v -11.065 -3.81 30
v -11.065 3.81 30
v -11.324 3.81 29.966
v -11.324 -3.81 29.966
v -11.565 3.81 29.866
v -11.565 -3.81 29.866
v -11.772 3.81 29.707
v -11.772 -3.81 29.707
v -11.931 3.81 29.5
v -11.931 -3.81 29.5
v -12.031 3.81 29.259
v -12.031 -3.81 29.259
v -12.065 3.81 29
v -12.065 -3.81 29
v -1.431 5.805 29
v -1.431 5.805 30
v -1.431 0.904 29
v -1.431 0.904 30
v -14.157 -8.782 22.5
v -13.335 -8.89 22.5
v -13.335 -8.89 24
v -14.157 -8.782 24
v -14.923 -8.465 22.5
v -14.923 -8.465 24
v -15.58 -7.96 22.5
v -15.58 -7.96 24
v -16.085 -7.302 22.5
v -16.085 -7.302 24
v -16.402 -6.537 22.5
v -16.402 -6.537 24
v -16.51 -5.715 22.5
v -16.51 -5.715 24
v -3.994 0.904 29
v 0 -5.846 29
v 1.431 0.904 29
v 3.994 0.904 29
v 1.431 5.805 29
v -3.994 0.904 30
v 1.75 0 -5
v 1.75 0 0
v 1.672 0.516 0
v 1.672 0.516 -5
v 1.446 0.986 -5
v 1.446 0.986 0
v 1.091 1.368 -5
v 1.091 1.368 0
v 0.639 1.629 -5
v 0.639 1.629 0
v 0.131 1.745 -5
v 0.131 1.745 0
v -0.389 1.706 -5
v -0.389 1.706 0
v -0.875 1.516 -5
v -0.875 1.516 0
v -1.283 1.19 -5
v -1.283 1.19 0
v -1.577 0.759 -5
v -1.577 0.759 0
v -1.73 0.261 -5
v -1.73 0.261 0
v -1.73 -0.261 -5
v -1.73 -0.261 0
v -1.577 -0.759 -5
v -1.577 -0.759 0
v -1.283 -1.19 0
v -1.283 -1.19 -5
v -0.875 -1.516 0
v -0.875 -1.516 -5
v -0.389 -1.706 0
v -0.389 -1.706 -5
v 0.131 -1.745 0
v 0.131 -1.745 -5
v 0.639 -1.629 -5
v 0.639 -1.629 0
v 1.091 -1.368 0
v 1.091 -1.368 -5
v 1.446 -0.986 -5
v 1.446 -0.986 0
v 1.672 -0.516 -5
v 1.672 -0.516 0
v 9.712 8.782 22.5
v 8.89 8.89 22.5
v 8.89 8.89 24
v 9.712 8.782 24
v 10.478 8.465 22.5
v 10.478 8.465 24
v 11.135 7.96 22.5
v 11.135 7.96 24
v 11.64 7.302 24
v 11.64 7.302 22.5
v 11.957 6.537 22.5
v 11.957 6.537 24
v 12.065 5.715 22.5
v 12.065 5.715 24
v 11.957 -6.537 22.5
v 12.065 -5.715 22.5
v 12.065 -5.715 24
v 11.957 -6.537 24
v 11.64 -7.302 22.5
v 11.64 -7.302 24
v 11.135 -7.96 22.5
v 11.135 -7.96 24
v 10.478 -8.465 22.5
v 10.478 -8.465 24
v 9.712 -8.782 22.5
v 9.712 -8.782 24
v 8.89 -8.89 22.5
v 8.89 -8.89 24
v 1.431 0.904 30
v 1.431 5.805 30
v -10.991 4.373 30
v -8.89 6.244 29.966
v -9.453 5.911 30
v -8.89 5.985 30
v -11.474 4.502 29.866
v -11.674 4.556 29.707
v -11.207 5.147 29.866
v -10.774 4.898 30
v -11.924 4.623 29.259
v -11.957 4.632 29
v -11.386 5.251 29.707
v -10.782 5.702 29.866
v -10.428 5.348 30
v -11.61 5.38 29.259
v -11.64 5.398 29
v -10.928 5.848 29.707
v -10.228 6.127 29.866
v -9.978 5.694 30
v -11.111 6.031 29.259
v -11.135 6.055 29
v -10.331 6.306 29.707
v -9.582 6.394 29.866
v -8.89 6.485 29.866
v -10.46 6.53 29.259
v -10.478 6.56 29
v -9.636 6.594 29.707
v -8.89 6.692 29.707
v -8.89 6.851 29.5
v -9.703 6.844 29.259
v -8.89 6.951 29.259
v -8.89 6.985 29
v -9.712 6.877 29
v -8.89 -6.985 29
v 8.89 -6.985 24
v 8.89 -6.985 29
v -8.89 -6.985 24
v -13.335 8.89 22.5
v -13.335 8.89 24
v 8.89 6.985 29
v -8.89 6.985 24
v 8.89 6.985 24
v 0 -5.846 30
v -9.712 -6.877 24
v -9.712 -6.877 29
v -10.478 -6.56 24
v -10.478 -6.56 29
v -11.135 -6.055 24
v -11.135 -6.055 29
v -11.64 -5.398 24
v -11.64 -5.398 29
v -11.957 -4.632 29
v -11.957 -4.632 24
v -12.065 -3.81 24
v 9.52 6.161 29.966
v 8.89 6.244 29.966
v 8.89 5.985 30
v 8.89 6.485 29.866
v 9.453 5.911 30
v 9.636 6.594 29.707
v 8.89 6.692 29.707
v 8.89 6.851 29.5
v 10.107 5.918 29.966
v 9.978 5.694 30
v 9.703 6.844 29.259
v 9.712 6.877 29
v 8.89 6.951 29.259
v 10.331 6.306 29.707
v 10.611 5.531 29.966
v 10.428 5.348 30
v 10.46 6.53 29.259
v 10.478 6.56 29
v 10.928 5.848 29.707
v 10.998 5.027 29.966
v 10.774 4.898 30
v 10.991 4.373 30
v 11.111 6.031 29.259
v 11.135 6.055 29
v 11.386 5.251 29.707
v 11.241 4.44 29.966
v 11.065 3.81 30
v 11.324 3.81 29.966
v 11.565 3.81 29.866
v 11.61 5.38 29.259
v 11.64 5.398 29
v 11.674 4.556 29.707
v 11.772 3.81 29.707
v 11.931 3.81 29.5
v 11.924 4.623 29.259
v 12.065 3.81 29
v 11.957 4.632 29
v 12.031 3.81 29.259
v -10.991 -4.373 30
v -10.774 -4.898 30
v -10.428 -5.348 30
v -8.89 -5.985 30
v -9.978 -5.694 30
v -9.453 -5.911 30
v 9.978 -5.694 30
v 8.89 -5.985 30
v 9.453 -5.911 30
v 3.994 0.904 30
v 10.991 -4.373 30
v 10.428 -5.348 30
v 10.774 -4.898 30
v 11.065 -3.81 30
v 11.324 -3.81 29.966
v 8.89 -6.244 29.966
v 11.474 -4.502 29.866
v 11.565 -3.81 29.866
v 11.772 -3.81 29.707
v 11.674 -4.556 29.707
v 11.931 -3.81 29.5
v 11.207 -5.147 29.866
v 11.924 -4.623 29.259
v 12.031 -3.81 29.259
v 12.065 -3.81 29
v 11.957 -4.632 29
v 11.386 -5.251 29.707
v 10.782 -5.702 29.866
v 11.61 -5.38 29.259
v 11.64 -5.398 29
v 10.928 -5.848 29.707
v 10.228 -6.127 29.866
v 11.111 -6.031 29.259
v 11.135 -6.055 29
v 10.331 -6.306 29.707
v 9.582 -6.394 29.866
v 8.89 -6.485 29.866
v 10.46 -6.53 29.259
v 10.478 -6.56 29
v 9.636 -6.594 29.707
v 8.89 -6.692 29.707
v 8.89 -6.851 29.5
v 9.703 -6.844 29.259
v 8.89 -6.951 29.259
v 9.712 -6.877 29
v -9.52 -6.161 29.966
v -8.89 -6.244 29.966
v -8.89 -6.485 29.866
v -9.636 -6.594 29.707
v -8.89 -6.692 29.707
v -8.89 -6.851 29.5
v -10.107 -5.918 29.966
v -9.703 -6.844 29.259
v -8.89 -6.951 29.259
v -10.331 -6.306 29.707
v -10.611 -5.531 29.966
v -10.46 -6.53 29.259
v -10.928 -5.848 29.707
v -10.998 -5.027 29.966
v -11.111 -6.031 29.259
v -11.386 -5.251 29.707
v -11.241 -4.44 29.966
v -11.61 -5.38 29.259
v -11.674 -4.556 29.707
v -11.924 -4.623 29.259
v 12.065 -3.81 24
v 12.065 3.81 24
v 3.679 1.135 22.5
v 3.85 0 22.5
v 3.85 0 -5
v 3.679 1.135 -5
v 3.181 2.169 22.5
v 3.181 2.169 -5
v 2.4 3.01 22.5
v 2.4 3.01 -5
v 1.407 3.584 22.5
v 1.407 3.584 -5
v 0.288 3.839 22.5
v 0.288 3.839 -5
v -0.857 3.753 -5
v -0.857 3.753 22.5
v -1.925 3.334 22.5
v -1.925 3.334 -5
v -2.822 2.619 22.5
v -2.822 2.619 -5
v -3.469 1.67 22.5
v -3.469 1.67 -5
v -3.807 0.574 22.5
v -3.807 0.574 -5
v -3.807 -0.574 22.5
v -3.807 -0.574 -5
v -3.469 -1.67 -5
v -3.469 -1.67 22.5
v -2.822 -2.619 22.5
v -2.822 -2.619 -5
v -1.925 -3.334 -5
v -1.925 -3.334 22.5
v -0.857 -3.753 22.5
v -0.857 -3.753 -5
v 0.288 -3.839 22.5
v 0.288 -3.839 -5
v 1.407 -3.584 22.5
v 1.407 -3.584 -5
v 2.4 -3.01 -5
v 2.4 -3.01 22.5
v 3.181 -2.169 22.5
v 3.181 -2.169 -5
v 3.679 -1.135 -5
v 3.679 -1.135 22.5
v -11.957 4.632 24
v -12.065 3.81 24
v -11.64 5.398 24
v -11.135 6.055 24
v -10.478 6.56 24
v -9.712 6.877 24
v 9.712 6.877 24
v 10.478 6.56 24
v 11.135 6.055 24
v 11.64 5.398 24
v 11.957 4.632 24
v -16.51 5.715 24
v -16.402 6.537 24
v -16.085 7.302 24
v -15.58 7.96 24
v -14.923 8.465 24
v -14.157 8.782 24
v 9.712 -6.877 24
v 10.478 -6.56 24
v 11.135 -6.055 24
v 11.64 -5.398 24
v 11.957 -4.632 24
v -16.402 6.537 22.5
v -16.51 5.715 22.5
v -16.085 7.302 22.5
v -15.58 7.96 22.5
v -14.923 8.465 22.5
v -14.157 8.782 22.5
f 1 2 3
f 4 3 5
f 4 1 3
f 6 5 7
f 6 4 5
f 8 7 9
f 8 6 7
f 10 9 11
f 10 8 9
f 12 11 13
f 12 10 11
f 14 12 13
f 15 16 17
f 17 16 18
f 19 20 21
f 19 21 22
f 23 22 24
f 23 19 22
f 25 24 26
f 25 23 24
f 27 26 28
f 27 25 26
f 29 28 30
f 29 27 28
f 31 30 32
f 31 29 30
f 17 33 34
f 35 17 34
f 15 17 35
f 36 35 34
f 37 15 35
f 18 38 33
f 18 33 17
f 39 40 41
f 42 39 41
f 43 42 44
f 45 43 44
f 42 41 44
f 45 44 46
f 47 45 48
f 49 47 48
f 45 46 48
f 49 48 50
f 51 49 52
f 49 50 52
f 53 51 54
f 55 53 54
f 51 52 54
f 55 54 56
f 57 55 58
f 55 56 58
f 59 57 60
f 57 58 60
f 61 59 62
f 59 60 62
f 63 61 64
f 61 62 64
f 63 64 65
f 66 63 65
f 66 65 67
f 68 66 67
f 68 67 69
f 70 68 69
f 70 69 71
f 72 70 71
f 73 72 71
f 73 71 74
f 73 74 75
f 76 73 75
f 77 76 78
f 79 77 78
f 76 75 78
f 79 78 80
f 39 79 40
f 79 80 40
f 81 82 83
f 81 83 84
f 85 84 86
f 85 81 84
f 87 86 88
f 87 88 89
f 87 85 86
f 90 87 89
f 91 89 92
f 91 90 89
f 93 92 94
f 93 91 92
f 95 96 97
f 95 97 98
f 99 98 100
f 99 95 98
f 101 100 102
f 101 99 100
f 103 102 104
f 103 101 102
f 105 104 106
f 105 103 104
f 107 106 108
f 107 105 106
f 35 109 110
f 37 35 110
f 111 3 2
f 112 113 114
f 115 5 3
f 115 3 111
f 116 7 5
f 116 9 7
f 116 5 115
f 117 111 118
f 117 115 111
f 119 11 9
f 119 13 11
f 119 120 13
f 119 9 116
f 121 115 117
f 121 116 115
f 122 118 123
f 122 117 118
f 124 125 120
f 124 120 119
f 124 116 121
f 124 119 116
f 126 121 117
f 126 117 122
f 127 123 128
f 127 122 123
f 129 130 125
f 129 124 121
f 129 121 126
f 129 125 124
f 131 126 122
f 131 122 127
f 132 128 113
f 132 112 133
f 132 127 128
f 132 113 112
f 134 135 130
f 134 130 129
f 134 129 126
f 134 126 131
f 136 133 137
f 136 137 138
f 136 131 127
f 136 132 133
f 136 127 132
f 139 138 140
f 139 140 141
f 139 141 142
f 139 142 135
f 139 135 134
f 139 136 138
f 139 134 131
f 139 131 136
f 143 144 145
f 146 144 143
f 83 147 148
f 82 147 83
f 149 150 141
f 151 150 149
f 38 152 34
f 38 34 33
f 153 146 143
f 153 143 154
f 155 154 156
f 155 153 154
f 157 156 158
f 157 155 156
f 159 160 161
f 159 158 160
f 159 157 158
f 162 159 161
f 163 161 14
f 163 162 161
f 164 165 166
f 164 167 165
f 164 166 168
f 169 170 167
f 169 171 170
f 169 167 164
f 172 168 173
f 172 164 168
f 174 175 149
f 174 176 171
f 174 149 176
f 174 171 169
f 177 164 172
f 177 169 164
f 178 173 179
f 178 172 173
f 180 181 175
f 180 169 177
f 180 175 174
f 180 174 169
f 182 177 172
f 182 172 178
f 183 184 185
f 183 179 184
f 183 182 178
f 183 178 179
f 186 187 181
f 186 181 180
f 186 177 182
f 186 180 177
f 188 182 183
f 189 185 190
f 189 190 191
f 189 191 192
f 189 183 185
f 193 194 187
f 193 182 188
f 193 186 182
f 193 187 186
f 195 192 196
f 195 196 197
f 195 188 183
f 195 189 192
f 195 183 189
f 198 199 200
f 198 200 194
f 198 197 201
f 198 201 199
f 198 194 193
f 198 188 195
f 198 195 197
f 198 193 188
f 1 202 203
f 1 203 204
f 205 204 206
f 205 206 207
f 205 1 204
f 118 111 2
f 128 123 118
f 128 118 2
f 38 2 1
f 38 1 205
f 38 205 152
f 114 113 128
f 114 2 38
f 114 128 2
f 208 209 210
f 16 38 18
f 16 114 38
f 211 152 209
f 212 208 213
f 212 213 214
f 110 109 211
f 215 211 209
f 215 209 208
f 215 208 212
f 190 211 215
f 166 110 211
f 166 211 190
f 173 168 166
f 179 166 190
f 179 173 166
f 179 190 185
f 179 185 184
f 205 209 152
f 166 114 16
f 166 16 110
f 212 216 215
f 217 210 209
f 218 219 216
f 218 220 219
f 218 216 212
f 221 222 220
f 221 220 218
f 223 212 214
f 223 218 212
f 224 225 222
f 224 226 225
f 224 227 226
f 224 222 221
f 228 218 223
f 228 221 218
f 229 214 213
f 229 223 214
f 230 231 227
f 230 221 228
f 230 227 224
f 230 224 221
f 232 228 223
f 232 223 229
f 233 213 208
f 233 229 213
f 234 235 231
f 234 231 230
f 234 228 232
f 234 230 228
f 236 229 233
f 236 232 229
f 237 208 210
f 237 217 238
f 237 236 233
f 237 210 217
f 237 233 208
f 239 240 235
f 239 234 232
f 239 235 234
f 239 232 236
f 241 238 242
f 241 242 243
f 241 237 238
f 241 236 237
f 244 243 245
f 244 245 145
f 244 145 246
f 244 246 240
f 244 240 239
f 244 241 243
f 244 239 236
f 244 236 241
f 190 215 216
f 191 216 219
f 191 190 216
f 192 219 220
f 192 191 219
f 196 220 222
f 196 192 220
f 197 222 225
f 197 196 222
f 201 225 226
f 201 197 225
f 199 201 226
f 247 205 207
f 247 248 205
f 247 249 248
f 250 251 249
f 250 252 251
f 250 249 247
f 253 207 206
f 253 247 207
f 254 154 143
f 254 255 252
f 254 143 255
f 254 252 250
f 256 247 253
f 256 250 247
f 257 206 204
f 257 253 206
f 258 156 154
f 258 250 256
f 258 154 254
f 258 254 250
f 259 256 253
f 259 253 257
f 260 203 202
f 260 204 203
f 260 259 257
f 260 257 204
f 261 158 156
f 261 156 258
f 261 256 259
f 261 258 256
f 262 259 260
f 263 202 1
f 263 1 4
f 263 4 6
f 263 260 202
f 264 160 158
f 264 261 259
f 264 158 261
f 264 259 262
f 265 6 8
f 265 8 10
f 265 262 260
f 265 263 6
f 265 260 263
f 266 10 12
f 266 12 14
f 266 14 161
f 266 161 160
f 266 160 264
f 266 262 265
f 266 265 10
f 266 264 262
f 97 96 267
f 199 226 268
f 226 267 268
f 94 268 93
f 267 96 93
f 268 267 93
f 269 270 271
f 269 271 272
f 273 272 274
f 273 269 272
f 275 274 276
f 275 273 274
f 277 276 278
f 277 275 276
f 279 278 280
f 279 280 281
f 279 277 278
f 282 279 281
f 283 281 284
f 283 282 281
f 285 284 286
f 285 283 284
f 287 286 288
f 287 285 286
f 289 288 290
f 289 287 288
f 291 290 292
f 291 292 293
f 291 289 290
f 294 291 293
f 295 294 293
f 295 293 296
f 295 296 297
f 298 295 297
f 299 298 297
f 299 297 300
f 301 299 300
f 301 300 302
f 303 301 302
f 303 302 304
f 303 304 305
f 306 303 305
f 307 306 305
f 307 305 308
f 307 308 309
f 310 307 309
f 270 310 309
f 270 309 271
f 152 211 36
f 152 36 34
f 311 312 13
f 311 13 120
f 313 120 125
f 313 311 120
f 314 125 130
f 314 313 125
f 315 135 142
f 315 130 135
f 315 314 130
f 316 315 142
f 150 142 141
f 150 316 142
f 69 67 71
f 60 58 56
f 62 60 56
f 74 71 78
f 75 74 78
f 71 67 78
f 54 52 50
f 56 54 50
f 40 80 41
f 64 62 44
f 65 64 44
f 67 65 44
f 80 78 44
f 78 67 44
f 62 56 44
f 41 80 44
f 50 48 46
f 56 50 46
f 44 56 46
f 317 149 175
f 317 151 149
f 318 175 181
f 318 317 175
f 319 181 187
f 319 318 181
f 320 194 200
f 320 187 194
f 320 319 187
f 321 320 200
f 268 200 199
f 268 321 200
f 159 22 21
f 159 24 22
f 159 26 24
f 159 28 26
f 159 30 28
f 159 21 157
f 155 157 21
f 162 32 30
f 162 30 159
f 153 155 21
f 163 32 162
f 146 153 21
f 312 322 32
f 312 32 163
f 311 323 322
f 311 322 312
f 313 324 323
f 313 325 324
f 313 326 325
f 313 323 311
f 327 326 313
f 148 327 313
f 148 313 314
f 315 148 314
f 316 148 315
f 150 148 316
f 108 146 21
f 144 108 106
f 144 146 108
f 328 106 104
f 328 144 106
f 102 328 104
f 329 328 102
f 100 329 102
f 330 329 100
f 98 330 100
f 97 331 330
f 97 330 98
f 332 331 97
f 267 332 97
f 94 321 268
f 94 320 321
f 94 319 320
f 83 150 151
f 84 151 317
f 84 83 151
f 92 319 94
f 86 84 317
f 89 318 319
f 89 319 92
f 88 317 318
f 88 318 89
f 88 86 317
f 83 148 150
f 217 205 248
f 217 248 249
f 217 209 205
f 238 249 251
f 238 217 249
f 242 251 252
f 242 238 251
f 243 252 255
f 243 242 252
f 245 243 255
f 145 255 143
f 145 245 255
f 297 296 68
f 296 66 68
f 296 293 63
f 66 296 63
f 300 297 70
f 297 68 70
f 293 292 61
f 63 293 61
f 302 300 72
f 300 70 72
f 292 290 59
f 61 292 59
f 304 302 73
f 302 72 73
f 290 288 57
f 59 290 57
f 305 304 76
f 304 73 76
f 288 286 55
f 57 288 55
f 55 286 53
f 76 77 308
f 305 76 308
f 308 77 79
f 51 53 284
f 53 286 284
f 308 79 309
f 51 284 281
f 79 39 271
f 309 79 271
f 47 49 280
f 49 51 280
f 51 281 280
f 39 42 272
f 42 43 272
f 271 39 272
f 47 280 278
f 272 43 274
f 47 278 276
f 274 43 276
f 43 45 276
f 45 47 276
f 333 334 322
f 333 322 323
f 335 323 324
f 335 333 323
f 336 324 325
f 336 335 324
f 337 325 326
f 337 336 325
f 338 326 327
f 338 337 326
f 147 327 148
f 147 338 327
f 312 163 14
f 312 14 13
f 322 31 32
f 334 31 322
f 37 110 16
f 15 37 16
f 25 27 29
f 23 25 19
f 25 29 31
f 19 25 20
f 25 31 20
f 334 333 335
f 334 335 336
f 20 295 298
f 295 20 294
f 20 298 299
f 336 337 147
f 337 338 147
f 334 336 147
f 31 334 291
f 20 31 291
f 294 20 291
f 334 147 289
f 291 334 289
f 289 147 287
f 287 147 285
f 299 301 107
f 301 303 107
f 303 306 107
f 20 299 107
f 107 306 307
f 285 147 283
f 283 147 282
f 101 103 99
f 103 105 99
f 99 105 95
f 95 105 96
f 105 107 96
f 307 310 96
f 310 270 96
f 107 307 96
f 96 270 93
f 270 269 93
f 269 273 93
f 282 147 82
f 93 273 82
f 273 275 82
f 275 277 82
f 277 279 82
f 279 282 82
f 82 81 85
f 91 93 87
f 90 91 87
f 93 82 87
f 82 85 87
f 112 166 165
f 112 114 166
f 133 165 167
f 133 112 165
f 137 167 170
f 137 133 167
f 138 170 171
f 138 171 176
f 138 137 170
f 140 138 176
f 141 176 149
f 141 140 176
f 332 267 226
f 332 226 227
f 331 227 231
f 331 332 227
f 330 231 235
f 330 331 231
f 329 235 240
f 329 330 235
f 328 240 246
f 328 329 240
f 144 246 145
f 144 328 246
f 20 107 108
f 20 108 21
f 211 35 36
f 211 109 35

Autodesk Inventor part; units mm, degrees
ref_plane "YZ Plane" through (0, 0, 0) normal (1, 0, 0) x (0, 1, 0)
ref_plane "XZ Plane" through (0, 0, 0) normal (0, 1, 0) x (-1, 0, 0)
ref_plane "XY Plane" through (0, 0, 0) normal (0, 0, 1) x (1, 0, 0)
sketch "Sketch1" plane through (0, 0, 0) normal (0, 0, 1) x (1, 0, 0)
  circle A0 centre (0, 0) radius 1.75 projected
  circle A1 centre (0, 0) radius 3.85
  point P0 (0, 0)
extrude "Extrusion1" add sketch "Sketch1" against normal blind 5
sketch "Sketch2" plane through (0, 0, 0) normal (0, 0, 1) x (1, 0, 0)
  point P0 (0, 0)
sketch "Sketch3" plane through (0, 0, 0) normal (0, 0, 1) x (1, 0, 0)
  circle A0 centre (0, 0) radius 3.85
extrude "Extrusion2" add sketch "Sketch3" along normal blind 22.5
sketch "Sketch4" plane through (0, 0, 22.5) normal (0, 0, 1) x (1, 0, 0)
  line L0 (12.065, -6.985) -> (-12.065, -6.985)
  line L1 (-12.065, -6.985) -> (-12.065, 6.985)
  line L2 (-12.065, 6.985) -> (12.065, 6.985)
  line L3 (12.065, 6.985) -> (12.065, -6.985)
  circle A0 centre (0, 0) radius 1.85 projected
  line L4 (12.065, -6.985) -> (-12.065, 6.985) construction
  line L5 (-12.065, -6.985) -> (12.065, 6.985) construction
  line L6 (12.065, 12.065) -> (-12.065, 12.065) construction
  line L7 (-12.065, 12.065) -> (-12.065, 26.035) construction
  line L8 (-12.065, 26.035) -> (12.065, 26.035) construction
  line L9 (12.065, 26.035) -> (12.065, 12.065) construction
  line L10 (12.065, 12.065) -> (-12.065, 26.035) construction
  line L11 (-12.065, 12.065) -> (12.065, 26.035) construction
  line L12 (12.065, -8.89) -> (-16.51, -8.89)
  line L13 (-16.51, -8.89) -> (-16.51, 8.89)
  line L14 (-16.51, 8.89) -> (12.065, 8.89)
  line L15 (16.51, -8.89) -> (-16.51, 8.89) construction
  line L16 (-16.51, -8.89) -> (12.065, 6.4965) construction
  line L17 (12.065, -8.89) -> (12.065, 8.89)
  point P0 (0, 0)
  point P1 (0, 19.05)
  dimension "d6" = 24.13
  dimension "d7" = 13.97
  dimension "d10" = 19.05
  dimension "d16" = 17.78
extrude "Extrusion3" add sketch "Sketch4" along normal blind 1.5 contours L17 L12 L13 L14 L2 L1 L0 | L0 L1 L2 L3 | A0
extrude "Extrusion4" add sketch "Sketch4" along normal blind 7.5 contours L0 L1 L2 L3 | A0
fillet "Fillet1" radius 3.175 8 edges at (-12.065, 6.985, 27) (12.065, 6.985, 27) (12.065, -6.985, 27) (-12.065, -6.985, 27) (-16.51, -8.89, 23.25) (12.065, 8.89, 23.25) (-16.51, 8.89, 23.25) (12.065, -8.89, 23.25)
sketch "Sketch5" plane through (0, 0, 30) normal (0, 0, 1) x (1, 0, 0)
  line L0 (0, -5.8462) -> (3.9945, 0.9035)
  line L1 (-3.9945, 0.9035) -> (0, -5.8462)
  line L2 (-1.4311, 0.9035) -> (-1.4311, 5.8047)
  line L3 (-1.4311, 5.8047) -> (1.4311, 5.8047)
  line L4 (1.4311, 5.8047) -> (1.4311, 0.9035)
  line L5 (-8.89, -6.985) -> (8.89, -6.985) projected
  arc A0 (-8.89, 6.985) -> (-12.065, 3.81) centre (-8.89, 3.81) ccw projected
  line L6 (8.89, 6.985) -> (-8.89, 6.985) projected
  arc A1 (12.065, 3.81) -> (8.89, 6.985) centre (8.89, 3.81) ccw projected
  arc A2 (8.89, -6.985) -> (12.065, -3.81) centre (8.89, -3.81) ccw projected
  line L7 (12.065, -3.81) -> (12.065, 3.81) projected
  arc A3 (-12.065, -3.81) -> (-8.89, -6.985) centre (-8.89, -3.81) ccw projected
  line L8 (-12.065, 3.81) -> (-12.065, -3.81) projected
  line L9 (3.9945, 0.9035) -> (1.4311, 0.9035)
  line L10 (-1.4311, 0.9035) -> (-3.9945, 0.9035)
  point P0 (0, 0)
  point P1 (0, 0.9035)
  point P2 (0, -6.985)
emboss "Emboss1" sketch "Sketch5" operation cut depth 1 direction (0, 0, -1) contours L1 L10 L2 L3 L4 L9 L0
fillet "Fillet2" radius 1 8 edges at (-11.1351, 6.0551, 30) (-12.065, 0, 30) (-11.1351, -6.0551, 30) (0, -6.985, 30) (11.1351, -6.0551, 30) (12.065, 0, 30) (11.1351, 6.0551, 30) (0, 6.985, 30)
properties part number "Button Cover"
